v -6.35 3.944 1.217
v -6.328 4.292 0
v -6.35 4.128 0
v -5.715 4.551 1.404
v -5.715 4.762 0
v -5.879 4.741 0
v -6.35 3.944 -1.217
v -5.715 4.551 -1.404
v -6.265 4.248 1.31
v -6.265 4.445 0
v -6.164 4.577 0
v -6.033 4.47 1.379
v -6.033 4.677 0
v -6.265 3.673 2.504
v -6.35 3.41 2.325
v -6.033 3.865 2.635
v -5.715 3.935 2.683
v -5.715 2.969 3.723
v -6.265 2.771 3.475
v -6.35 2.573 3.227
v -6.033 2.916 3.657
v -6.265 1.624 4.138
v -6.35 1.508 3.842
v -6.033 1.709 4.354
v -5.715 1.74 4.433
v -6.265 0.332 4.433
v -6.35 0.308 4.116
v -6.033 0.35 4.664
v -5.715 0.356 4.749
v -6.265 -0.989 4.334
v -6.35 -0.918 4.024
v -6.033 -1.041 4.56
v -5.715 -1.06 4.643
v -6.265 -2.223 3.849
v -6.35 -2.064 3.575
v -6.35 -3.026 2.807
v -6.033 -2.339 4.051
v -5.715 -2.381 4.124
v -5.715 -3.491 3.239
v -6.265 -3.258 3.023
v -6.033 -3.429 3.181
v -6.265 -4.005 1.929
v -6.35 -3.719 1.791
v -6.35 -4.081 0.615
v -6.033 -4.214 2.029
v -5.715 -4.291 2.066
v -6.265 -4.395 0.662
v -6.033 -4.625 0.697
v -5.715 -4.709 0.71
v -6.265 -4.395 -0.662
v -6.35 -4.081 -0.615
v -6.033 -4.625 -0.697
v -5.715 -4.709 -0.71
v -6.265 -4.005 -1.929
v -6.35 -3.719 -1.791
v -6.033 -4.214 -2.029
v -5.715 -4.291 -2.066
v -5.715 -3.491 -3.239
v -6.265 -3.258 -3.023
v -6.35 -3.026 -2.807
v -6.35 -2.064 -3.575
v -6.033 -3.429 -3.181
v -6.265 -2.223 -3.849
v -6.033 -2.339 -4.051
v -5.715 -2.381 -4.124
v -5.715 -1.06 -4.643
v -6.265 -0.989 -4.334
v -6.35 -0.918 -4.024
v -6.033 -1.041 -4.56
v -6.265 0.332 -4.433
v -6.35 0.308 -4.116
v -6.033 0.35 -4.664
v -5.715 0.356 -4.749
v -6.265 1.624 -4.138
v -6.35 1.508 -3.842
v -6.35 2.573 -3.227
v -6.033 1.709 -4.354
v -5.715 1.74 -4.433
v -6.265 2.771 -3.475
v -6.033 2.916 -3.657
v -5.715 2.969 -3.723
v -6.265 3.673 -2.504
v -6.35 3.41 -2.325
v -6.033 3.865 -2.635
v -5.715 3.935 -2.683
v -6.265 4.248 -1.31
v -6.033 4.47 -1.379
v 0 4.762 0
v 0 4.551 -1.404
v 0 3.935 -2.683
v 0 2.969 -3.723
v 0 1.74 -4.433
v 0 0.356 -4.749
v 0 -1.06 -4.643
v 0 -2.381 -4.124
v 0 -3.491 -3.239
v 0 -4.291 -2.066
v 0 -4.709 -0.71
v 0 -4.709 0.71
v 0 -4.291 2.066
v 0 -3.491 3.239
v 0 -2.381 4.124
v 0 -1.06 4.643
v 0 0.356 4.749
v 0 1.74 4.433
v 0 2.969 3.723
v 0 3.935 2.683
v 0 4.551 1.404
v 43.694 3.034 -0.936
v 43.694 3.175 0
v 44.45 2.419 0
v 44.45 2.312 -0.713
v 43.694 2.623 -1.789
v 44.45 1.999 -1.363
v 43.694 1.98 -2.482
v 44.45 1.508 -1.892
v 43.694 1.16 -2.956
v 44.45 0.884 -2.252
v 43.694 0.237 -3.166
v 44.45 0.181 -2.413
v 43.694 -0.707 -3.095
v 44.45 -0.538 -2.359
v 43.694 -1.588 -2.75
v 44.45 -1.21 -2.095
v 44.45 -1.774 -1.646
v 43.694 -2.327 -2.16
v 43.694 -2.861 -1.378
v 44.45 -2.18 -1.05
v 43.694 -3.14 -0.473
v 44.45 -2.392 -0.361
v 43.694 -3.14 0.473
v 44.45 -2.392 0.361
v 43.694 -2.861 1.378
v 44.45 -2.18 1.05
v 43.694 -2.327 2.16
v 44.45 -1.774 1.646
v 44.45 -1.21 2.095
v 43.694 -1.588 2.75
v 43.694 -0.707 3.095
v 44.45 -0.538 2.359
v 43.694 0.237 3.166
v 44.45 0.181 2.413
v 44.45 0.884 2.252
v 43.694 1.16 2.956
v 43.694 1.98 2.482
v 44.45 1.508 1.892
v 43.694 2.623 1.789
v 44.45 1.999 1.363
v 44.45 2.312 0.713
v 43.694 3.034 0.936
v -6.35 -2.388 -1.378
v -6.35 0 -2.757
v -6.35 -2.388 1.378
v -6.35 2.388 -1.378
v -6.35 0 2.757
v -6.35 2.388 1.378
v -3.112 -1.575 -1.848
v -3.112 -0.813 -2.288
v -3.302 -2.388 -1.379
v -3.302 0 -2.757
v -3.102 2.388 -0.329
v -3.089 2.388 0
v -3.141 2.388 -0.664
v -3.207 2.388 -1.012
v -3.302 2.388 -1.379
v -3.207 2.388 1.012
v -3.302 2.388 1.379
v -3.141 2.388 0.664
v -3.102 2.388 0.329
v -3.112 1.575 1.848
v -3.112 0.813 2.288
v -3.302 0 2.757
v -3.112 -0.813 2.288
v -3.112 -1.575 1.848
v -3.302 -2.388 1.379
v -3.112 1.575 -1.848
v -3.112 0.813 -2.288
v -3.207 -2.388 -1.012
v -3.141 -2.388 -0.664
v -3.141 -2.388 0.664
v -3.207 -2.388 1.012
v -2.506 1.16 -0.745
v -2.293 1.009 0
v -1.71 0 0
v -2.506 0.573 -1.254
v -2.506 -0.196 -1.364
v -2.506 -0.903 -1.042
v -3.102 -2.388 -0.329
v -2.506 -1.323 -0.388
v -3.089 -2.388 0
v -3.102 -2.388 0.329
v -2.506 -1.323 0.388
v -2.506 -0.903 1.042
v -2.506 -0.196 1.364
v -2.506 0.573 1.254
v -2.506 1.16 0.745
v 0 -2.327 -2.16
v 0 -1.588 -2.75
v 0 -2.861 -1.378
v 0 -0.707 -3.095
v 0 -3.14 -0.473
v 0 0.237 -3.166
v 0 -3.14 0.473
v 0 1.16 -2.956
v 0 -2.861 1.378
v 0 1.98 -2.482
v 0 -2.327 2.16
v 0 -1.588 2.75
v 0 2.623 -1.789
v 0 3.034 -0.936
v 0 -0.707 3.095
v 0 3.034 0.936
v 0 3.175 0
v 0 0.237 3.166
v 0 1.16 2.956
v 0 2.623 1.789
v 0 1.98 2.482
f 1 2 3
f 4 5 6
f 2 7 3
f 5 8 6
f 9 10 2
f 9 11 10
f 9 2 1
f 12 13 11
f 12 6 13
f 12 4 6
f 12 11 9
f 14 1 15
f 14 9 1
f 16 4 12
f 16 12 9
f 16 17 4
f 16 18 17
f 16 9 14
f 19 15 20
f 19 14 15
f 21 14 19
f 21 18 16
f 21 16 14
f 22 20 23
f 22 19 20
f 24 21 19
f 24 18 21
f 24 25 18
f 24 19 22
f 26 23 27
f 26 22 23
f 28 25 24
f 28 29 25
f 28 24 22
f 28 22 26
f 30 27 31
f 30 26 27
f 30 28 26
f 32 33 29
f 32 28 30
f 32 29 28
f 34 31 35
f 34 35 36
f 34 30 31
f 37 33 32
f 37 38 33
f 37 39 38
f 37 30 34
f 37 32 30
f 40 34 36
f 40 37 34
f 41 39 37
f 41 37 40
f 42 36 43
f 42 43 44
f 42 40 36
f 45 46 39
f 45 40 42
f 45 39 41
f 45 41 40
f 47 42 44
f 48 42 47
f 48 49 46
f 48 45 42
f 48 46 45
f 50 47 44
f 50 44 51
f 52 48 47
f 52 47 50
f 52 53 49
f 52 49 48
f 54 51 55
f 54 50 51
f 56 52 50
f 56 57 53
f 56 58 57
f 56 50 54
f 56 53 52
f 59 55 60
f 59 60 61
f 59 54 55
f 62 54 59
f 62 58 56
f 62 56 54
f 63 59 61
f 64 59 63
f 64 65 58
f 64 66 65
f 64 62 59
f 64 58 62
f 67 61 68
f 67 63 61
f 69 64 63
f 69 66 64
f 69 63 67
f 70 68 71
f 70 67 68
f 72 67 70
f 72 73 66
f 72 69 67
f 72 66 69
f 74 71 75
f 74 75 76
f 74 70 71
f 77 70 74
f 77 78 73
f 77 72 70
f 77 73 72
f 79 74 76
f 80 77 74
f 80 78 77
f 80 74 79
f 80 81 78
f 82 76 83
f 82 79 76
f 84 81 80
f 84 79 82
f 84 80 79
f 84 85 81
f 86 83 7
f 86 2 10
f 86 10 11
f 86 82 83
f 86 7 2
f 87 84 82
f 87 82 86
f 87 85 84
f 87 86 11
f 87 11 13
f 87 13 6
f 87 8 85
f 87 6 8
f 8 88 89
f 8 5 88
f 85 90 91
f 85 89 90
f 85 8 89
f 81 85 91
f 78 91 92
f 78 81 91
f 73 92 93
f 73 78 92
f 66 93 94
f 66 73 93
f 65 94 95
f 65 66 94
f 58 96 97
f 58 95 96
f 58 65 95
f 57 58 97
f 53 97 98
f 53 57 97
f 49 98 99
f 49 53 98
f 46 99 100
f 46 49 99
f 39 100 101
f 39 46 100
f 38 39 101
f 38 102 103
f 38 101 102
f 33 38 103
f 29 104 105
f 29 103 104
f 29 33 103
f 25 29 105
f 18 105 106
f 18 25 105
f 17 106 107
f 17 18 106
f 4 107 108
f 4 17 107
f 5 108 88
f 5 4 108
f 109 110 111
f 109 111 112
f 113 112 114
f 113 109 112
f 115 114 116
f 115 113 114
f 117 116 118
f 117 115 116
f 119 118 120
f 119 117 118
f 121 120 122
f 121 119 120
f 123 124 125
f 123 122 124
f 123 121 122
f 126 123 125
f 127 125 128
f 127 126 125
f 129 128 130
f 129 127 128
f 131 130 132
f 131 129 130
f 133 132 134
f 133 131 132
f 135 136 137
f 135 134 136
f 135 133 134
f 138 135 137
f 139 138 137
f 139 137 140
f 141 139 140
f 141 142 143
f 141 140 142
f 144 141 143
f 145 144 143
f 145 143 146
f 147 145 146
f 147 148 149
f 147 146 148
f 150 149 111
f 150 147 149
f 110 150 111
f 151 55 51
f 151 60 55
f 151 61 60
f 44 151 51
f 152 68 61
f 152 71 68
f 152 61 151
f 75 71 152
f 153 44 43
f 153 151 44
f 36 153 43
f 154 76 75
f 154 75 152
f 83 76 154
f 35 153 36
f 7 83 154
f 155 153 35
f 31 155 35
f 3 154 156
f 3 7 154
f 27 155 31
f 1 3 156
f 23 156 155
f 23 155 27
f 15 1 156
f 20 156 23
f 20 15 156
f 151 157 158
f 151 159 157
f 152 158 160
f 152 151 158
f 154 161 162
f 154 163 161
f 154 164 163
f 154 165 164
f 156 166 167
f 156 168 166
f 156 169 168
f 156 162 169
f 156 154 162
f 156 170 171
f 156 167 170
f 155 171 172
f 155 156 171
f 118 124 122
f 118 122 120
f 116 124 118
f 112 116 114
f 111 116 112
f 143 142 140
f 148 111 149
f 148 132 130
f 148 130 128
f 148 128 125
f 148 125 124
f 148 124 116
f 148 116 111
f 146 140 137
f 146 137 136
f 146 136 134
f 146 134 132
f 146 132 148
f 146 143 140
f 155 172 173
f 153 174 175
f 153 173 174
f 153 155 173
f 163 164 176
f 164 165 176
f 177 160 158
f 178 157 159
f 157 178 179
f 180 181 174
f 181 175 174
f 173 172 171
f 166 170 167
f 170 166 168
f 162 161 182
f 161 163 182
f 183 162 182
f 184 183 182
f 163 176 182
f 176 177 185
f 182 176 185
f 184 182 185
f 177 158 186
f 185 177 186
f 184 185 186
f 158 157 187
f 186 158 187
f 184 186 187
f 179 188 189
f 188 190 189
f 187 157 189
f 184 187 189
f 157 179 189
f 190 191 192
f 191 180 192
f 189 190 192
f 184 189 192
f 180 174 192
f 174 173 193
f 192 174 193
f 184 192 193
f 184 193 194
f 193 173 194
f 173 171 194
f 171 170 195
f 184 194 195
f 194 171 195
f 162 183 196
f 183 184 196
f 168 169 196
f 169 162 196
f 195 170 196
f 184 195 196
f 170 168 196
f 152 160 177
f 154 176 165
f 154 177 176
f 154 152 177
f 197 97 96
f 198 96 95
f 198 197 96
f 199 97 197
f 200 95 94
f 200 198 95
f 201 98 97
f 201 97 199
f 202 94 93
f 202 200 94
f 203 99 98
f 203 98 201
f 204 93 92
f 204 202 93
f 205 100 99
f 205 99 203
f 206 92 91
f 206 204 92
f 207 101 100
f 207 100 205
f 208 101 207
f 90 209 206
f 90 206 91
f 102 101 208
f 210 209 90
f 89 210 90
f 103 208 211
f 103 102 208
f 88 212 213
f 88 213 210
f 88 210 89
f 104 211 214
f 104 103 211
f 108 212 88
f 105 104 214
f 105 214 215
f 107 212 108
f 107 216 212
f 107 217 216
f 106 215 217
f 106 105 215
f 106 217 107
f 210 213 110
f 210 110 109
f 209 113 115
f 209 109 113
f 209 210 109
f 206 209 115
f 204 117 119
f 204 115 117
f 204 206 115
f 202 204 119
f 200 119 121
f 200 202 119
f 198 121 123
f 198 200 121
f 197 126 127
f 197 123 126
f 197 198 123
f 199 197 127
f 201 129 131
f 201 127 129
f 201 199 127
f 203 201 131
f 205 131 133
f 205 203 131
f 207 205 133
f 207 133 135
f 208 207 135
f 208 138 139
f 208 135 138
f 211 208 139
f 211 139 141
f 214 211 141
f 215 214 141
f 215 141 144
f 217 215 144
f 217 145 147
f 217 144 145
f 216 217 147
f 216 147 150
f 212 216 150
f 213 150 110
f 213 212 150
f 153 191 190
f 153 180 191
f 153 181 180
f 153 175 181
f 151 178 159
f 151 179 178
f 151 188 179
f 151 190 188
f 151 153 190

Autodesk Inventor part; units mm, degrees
ref_plane "YZ Plane" through (0, 0, 0) normal (1, 0, 0) x (0, 1, 0)
ref_plane "XZ Plane" through (0, 0, 0) normal (0, 1, 0) x (-1, 0, 0)
sketch "Sketch1" plane through (0, 0, 0) normal (0, 0, 1) x (1, 0, 0)
  line L0 (-1.7103, 0) -> (44.45, 0)
  line L1 (44.45, 0) -> (44.45, 3.175)
  line L2 (44.45, 3.175) -> (12.7, 3.175)
  line L3 (12.7, 3.175) -> (9.5249, 3.175)
  line L4 (9.5249, 3.175) -> (0, 3.175)
  line L5 (0, 3.175) -> (0, 4.7625)
  line L6 (0, 4.7625) -> (-6.35, 4.7625)
  line L7 (-6.35, 4.7625) -> (-6.35, 2.757)
  line L8 (-6.35, 2.757) -> (-3.302, 2.757)
  line L9 (-3.302, 2.757) -> (-1.7103, 0)
  line L10 (-16.51, 0) -> (54.61, 0) projected
  line L11 (0, -0.9525) -> (0, 5.715) projected
  line L12 (12.7, 3.175) -> (0, 3.175) construction
  dimension "d1" = 31.75
  dimension "d2" = 3.1751
  dimension "d3" = 6.35
  dimension "d4" = 3.048
  dimension "d5" = 60
  dimension "d6" = 6.35
  dimension "d7" = 6.35
  dimension "d8" = 5.5139
  dimension "d9" = 9.525
  dimension "d26" = 44.45
revolve "Body" add sketch "Sketch1" angle 360 about axis through (-1.7103, 0, 0) along (1, 0, 0)
sketch "Sketch2" plane through (-6.35, 0, 0) normal (-1, 0, 0) x (0, 0, 1)
  circle A0 centre (0, 0) radius 2.757 projected
  line L0 (0, -6.6675) -> (0, 6.6675) projected
  line L1 (-6.6675, 0) -> (6.6675, 0) projected
  line L2 (2.757, 0) -> (1.3785, -2.3876)
  line L3 (1.3785, -2.3876) -> (-1.3785, -2.3876)
  line L4 (-1.3785, -2.3876) -> (-2.757, 0)
  line L5 (-2.757, 0) -> (-1.3785, 2.3876)
  line L6 (-1.3785, 2.3876) -> (1.3785, 2.3876)
  line L7 (1.3785, 2.3876) -> (2.757, 0)
extrude "Slot" add sketch "Sketch2" against normal up to next contours L7 A0 | A0 L2 | L6 L0 A0 | A0 L0 L3 | L0 L6 A0 | A0 L3 L0 | L4 A0 | A0 L5
fillet "Fillet1" radius 0.635 1 edges at (-6.35, -4.7625, 0)
thread "Thread" size "1/4-20 UNC" class "2A" standard "ANSI Unified Screw Threads" length 31.75
chamfer "Chamfer1" distance 0.7556 distance2 0.7556 1 edges at (44.45, -3.175, 0) measured on face at (44.45, 0.6012, -0.3644)
ref_plane "Work Plane1" through (29, 0, 0) normal (0, -1, 0) x (1, 0, 0)
equation "\"d17\" = RR"
equation "\"d13\" = GEL"
equation "\"d15\" = -0.5 * SPD + 0.5 * GD"
equation "\"d16\" = GUL"
equation "\"d1\" = GEL"
equation "\"d3\" = KOH"
equation "\"d4\" = INTI"
equation "\"d6\" = GD"
equation "\"d7\" = BDM"
equation "\"d8\" = 1.1547 * SW"
equation "\"d9\" = KOD"
equation "\"d26\" = NLG"
equation "\"GD\" = 6.35"
equation "\"NLG\" = 44.45"
equation "\"GEL\" = 31.75"
equation "\"KOD\" = 9.525"
equation "\"KOH\" = 6.35"
equation "\"INTI\" = 3.048"
equation "\"GAL\" = 3.175"
equation "\"GUL\" = 0.75565"
equation "\"BDM\" = 6.35"
equation "\"SW\" = 4.7752"
equation "\"RR\" = 0.635"
equation "\"SPD\" = 4.8387"
equation "\"R\" = 0.1778"
equation "\"PHH\" = 0.2032"
equation "\"GD1\" = SPD"
equation "\"THREADDIA\" = 6.35"
equation "\"FAWI\" = 45deg"
equation "\"KOH1\" = 5.715"
equation "\"NND\" = 6.35"
equation "\"TOA\" = 30deg"
equation "\"E0\" = 1.155 * SW"
properties part number "am-1058" material "Steel"
